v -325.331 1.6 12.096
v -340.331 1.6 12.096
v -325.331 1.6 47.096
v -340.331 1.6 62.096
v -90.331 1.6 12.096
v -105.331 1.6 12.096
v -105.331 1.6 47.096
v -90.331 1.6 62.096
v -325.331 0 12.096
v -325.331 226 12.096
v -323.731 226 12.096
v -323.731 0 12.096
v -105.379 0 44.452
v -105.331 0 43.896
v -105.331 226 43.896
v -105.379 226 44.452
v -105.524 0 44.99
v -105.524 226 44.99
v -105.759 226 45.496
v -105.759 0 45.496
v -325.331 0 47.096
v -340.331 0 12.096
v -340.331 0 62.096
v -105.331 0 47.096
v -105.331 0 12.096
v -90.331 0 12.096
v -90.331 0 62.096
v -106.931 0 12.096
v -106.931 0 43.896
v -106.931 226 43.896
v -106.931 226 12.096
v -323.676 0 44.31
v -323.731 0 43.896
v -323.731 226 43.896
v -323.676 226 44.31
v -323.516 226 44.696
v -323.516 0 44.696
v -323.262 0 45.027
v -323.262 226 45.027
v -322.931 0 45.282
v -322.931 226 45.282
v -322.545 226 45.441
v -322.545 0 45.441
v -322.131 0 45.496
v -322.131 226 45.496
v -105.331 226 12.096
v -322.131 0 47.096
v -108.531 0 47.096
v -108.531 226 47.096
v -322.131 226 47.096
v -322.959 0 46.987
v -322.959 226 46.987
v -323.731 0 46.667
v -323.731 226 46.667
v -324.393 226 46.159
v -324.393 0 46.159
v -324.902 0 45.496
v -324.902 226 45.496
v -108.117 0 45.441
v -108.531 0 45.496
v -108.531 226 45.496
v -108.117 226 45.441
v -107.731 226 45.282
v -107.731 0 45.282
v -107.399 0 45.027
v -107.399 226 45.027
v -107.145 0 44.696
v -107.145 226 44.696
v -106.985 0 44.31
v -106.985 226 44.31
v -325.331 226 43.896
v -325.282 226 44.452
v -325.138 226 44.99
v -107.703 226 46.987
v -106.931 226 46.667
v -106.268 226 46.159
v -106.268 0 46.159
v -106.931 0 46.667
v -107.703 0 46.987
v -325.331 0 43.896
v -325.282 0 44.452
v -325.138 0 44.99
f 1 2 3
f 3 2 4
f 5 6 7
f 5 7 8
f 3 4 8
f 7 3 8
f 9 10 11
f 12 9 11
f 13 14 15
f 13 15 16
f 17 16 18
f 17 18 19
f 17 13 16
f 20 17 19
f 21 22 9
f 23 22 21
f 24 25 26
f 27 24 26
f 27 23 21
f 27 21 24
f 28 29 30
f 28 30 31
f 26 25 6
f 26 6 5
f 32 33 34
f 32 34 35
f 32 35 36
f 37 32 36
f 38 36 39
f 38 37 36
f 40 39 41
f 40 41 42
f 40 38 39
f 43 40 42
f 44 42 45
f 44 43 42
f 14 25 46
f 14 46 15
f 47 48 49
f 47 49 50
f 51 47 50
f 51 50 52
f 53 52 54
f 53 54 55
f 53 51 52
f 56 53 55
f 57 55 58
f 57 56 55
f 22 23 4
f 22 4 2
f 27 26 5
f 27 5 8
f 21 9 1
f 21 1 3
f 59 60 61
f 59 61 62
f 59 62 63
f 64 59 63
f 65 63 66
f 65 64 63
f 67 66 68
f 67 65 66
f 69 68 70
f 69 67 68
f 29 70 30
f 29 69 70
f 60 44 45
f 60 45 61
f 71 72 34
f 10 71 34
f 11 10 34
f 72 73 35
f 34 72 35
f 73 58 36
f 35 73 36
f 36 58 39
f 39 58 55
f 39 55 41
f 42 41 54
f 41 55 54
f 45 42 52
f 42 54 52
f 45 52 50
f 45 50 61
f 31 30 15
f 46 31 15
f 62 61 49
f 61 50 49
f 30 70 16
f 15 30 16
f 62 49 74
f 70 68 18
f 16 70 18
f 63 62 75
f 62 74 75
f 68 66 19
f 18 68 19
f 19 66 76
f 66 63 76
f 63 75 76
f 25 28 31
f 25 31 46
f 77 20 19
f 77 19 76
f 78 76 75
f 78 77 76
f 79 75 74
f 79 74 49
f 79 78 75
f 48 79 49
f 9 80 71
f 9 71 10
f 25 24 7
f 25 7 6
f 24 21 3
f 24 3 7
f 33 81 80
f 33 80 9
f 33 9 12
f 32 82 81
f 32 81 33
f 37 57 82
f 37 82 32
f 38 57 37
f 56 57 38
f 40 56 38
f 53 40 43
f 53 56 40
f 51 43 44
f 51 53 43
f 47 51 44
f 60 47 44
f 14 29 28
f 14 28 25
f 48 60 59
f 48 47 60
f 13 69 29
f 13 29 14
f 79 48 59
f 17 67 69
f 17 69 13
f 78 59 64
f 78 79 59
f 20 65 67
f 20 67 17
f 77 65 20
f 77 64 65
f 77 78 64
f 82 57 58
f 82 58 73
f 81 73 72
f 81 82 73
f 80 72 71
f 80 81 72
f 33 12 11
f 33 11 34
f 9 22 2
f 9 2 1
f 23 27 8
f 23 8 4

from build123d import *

# Parameters (mm, degrees)
F1_DEPTH = 1.6
F2_DEPTH = 226


# Not quite as in the source:
# - ends of sketch curves that miss each other by under 0.0002 mm in the source are joined


with BuildPart() as f1:
    # F0 (on Front) → F1 (new body)
    with BuildSketch(Plane.XZ):
        Polygon((-105.330753, 62.095962), (-325.330753, 62.095962), (-325.330753, 47.095962), (-322.130753, 47.095962), (-108.530753, 47.095962), (-105.330753, 47.095962), align=None)
        Polygon((-90.330753, 62.095962), (-105.330753, 62.095962), (-105.330753, 47.095962), (-105.330753, 45.495962), (-105.330753, 43.895962), (-105.330753, 12.095962), (-90.330753, 12.095962), align=None)
        Polygon((-325.330753, 47.095962), (-325.330753, 62.095962), (-340.330753, 62.095962), (-340.330753, 12.095962), (-325.330753, 12.095962), (-325.330753, 43.895962), (-325.330753, 45.495962), align=None)
    extrude(amount=-F1_DEPTH)


with BuildPart() as f2:
    # F0 (on Front) → F2 (new body)
    with BuildSketch(Plane.XZ):
        with BuildLine():
            ThreePointArc((-105.330753, 43.895962), (-105.4397903748, 44.7241830149), (-105.7594717809, 45.4959621265))
            Line((-105.7594717809, 45.4959621265), (-108.530753, 45.495962))
            ThreePointArc((-108.530753, 45.495962), (-107.3993821501, 45.0273328499), (-106.930753, 43.895962))
            Line((-106.930753, 43.895962), (-106.930753, 12.095962))
            Line((-106.930753, 12.095962), (-105.330753, 12.095962))
            Line((-105.330753, 12.095962), (-105.330753, 43.895962))
        make_face()
        with BuildLine():
            Line((-108.530753, 47.095962), (-322.130753, 47.095962))
            ThreePointArc((-322.130753, 47.095962), (-323.7307529368, 46.6672433286), (-324.9020342191, 45.4959621265))
            Line((-324.9020342191, 45.4959621265), (-322.130753, 45.495962))
            Line((-322.130753, 45.495962), (-108.530753, 45.495962))
            Line((-108.530753, 45.495962), (-105.7594717809, 45.495962))
            ThreePointArc((-105.7594717809, 45.495962), (-106.9307530632, 46.6672433286), (-108.530753, 47.095962))
        make_face()
        with BuildLine():
            ThreePointArc((-324.9020342191, 45.4959621265), (-325.2217156252, 44.7241830149), (-325.330753, 43.895962))
            Line((-325.330753, 43.895962), (-325.330753, 12.095962))
            Line((-325.330753, 12.095962), (-323.730753, 12.095962))
            Line((-323.730753, 12.095962), (-323.730753, 43.895962))
            ThreePointArc((-323.730753, 43.895962), (-323.2621238499, 45.0273328499), (-322.130753, 45.495962))
            Line((-322.130753, 45.495962), (-324.9020342191, 45.4959621265))
        make_face()
    extrude(amount=-F2_DEPTH)


solid = Compound([f1.part, f2.part])
